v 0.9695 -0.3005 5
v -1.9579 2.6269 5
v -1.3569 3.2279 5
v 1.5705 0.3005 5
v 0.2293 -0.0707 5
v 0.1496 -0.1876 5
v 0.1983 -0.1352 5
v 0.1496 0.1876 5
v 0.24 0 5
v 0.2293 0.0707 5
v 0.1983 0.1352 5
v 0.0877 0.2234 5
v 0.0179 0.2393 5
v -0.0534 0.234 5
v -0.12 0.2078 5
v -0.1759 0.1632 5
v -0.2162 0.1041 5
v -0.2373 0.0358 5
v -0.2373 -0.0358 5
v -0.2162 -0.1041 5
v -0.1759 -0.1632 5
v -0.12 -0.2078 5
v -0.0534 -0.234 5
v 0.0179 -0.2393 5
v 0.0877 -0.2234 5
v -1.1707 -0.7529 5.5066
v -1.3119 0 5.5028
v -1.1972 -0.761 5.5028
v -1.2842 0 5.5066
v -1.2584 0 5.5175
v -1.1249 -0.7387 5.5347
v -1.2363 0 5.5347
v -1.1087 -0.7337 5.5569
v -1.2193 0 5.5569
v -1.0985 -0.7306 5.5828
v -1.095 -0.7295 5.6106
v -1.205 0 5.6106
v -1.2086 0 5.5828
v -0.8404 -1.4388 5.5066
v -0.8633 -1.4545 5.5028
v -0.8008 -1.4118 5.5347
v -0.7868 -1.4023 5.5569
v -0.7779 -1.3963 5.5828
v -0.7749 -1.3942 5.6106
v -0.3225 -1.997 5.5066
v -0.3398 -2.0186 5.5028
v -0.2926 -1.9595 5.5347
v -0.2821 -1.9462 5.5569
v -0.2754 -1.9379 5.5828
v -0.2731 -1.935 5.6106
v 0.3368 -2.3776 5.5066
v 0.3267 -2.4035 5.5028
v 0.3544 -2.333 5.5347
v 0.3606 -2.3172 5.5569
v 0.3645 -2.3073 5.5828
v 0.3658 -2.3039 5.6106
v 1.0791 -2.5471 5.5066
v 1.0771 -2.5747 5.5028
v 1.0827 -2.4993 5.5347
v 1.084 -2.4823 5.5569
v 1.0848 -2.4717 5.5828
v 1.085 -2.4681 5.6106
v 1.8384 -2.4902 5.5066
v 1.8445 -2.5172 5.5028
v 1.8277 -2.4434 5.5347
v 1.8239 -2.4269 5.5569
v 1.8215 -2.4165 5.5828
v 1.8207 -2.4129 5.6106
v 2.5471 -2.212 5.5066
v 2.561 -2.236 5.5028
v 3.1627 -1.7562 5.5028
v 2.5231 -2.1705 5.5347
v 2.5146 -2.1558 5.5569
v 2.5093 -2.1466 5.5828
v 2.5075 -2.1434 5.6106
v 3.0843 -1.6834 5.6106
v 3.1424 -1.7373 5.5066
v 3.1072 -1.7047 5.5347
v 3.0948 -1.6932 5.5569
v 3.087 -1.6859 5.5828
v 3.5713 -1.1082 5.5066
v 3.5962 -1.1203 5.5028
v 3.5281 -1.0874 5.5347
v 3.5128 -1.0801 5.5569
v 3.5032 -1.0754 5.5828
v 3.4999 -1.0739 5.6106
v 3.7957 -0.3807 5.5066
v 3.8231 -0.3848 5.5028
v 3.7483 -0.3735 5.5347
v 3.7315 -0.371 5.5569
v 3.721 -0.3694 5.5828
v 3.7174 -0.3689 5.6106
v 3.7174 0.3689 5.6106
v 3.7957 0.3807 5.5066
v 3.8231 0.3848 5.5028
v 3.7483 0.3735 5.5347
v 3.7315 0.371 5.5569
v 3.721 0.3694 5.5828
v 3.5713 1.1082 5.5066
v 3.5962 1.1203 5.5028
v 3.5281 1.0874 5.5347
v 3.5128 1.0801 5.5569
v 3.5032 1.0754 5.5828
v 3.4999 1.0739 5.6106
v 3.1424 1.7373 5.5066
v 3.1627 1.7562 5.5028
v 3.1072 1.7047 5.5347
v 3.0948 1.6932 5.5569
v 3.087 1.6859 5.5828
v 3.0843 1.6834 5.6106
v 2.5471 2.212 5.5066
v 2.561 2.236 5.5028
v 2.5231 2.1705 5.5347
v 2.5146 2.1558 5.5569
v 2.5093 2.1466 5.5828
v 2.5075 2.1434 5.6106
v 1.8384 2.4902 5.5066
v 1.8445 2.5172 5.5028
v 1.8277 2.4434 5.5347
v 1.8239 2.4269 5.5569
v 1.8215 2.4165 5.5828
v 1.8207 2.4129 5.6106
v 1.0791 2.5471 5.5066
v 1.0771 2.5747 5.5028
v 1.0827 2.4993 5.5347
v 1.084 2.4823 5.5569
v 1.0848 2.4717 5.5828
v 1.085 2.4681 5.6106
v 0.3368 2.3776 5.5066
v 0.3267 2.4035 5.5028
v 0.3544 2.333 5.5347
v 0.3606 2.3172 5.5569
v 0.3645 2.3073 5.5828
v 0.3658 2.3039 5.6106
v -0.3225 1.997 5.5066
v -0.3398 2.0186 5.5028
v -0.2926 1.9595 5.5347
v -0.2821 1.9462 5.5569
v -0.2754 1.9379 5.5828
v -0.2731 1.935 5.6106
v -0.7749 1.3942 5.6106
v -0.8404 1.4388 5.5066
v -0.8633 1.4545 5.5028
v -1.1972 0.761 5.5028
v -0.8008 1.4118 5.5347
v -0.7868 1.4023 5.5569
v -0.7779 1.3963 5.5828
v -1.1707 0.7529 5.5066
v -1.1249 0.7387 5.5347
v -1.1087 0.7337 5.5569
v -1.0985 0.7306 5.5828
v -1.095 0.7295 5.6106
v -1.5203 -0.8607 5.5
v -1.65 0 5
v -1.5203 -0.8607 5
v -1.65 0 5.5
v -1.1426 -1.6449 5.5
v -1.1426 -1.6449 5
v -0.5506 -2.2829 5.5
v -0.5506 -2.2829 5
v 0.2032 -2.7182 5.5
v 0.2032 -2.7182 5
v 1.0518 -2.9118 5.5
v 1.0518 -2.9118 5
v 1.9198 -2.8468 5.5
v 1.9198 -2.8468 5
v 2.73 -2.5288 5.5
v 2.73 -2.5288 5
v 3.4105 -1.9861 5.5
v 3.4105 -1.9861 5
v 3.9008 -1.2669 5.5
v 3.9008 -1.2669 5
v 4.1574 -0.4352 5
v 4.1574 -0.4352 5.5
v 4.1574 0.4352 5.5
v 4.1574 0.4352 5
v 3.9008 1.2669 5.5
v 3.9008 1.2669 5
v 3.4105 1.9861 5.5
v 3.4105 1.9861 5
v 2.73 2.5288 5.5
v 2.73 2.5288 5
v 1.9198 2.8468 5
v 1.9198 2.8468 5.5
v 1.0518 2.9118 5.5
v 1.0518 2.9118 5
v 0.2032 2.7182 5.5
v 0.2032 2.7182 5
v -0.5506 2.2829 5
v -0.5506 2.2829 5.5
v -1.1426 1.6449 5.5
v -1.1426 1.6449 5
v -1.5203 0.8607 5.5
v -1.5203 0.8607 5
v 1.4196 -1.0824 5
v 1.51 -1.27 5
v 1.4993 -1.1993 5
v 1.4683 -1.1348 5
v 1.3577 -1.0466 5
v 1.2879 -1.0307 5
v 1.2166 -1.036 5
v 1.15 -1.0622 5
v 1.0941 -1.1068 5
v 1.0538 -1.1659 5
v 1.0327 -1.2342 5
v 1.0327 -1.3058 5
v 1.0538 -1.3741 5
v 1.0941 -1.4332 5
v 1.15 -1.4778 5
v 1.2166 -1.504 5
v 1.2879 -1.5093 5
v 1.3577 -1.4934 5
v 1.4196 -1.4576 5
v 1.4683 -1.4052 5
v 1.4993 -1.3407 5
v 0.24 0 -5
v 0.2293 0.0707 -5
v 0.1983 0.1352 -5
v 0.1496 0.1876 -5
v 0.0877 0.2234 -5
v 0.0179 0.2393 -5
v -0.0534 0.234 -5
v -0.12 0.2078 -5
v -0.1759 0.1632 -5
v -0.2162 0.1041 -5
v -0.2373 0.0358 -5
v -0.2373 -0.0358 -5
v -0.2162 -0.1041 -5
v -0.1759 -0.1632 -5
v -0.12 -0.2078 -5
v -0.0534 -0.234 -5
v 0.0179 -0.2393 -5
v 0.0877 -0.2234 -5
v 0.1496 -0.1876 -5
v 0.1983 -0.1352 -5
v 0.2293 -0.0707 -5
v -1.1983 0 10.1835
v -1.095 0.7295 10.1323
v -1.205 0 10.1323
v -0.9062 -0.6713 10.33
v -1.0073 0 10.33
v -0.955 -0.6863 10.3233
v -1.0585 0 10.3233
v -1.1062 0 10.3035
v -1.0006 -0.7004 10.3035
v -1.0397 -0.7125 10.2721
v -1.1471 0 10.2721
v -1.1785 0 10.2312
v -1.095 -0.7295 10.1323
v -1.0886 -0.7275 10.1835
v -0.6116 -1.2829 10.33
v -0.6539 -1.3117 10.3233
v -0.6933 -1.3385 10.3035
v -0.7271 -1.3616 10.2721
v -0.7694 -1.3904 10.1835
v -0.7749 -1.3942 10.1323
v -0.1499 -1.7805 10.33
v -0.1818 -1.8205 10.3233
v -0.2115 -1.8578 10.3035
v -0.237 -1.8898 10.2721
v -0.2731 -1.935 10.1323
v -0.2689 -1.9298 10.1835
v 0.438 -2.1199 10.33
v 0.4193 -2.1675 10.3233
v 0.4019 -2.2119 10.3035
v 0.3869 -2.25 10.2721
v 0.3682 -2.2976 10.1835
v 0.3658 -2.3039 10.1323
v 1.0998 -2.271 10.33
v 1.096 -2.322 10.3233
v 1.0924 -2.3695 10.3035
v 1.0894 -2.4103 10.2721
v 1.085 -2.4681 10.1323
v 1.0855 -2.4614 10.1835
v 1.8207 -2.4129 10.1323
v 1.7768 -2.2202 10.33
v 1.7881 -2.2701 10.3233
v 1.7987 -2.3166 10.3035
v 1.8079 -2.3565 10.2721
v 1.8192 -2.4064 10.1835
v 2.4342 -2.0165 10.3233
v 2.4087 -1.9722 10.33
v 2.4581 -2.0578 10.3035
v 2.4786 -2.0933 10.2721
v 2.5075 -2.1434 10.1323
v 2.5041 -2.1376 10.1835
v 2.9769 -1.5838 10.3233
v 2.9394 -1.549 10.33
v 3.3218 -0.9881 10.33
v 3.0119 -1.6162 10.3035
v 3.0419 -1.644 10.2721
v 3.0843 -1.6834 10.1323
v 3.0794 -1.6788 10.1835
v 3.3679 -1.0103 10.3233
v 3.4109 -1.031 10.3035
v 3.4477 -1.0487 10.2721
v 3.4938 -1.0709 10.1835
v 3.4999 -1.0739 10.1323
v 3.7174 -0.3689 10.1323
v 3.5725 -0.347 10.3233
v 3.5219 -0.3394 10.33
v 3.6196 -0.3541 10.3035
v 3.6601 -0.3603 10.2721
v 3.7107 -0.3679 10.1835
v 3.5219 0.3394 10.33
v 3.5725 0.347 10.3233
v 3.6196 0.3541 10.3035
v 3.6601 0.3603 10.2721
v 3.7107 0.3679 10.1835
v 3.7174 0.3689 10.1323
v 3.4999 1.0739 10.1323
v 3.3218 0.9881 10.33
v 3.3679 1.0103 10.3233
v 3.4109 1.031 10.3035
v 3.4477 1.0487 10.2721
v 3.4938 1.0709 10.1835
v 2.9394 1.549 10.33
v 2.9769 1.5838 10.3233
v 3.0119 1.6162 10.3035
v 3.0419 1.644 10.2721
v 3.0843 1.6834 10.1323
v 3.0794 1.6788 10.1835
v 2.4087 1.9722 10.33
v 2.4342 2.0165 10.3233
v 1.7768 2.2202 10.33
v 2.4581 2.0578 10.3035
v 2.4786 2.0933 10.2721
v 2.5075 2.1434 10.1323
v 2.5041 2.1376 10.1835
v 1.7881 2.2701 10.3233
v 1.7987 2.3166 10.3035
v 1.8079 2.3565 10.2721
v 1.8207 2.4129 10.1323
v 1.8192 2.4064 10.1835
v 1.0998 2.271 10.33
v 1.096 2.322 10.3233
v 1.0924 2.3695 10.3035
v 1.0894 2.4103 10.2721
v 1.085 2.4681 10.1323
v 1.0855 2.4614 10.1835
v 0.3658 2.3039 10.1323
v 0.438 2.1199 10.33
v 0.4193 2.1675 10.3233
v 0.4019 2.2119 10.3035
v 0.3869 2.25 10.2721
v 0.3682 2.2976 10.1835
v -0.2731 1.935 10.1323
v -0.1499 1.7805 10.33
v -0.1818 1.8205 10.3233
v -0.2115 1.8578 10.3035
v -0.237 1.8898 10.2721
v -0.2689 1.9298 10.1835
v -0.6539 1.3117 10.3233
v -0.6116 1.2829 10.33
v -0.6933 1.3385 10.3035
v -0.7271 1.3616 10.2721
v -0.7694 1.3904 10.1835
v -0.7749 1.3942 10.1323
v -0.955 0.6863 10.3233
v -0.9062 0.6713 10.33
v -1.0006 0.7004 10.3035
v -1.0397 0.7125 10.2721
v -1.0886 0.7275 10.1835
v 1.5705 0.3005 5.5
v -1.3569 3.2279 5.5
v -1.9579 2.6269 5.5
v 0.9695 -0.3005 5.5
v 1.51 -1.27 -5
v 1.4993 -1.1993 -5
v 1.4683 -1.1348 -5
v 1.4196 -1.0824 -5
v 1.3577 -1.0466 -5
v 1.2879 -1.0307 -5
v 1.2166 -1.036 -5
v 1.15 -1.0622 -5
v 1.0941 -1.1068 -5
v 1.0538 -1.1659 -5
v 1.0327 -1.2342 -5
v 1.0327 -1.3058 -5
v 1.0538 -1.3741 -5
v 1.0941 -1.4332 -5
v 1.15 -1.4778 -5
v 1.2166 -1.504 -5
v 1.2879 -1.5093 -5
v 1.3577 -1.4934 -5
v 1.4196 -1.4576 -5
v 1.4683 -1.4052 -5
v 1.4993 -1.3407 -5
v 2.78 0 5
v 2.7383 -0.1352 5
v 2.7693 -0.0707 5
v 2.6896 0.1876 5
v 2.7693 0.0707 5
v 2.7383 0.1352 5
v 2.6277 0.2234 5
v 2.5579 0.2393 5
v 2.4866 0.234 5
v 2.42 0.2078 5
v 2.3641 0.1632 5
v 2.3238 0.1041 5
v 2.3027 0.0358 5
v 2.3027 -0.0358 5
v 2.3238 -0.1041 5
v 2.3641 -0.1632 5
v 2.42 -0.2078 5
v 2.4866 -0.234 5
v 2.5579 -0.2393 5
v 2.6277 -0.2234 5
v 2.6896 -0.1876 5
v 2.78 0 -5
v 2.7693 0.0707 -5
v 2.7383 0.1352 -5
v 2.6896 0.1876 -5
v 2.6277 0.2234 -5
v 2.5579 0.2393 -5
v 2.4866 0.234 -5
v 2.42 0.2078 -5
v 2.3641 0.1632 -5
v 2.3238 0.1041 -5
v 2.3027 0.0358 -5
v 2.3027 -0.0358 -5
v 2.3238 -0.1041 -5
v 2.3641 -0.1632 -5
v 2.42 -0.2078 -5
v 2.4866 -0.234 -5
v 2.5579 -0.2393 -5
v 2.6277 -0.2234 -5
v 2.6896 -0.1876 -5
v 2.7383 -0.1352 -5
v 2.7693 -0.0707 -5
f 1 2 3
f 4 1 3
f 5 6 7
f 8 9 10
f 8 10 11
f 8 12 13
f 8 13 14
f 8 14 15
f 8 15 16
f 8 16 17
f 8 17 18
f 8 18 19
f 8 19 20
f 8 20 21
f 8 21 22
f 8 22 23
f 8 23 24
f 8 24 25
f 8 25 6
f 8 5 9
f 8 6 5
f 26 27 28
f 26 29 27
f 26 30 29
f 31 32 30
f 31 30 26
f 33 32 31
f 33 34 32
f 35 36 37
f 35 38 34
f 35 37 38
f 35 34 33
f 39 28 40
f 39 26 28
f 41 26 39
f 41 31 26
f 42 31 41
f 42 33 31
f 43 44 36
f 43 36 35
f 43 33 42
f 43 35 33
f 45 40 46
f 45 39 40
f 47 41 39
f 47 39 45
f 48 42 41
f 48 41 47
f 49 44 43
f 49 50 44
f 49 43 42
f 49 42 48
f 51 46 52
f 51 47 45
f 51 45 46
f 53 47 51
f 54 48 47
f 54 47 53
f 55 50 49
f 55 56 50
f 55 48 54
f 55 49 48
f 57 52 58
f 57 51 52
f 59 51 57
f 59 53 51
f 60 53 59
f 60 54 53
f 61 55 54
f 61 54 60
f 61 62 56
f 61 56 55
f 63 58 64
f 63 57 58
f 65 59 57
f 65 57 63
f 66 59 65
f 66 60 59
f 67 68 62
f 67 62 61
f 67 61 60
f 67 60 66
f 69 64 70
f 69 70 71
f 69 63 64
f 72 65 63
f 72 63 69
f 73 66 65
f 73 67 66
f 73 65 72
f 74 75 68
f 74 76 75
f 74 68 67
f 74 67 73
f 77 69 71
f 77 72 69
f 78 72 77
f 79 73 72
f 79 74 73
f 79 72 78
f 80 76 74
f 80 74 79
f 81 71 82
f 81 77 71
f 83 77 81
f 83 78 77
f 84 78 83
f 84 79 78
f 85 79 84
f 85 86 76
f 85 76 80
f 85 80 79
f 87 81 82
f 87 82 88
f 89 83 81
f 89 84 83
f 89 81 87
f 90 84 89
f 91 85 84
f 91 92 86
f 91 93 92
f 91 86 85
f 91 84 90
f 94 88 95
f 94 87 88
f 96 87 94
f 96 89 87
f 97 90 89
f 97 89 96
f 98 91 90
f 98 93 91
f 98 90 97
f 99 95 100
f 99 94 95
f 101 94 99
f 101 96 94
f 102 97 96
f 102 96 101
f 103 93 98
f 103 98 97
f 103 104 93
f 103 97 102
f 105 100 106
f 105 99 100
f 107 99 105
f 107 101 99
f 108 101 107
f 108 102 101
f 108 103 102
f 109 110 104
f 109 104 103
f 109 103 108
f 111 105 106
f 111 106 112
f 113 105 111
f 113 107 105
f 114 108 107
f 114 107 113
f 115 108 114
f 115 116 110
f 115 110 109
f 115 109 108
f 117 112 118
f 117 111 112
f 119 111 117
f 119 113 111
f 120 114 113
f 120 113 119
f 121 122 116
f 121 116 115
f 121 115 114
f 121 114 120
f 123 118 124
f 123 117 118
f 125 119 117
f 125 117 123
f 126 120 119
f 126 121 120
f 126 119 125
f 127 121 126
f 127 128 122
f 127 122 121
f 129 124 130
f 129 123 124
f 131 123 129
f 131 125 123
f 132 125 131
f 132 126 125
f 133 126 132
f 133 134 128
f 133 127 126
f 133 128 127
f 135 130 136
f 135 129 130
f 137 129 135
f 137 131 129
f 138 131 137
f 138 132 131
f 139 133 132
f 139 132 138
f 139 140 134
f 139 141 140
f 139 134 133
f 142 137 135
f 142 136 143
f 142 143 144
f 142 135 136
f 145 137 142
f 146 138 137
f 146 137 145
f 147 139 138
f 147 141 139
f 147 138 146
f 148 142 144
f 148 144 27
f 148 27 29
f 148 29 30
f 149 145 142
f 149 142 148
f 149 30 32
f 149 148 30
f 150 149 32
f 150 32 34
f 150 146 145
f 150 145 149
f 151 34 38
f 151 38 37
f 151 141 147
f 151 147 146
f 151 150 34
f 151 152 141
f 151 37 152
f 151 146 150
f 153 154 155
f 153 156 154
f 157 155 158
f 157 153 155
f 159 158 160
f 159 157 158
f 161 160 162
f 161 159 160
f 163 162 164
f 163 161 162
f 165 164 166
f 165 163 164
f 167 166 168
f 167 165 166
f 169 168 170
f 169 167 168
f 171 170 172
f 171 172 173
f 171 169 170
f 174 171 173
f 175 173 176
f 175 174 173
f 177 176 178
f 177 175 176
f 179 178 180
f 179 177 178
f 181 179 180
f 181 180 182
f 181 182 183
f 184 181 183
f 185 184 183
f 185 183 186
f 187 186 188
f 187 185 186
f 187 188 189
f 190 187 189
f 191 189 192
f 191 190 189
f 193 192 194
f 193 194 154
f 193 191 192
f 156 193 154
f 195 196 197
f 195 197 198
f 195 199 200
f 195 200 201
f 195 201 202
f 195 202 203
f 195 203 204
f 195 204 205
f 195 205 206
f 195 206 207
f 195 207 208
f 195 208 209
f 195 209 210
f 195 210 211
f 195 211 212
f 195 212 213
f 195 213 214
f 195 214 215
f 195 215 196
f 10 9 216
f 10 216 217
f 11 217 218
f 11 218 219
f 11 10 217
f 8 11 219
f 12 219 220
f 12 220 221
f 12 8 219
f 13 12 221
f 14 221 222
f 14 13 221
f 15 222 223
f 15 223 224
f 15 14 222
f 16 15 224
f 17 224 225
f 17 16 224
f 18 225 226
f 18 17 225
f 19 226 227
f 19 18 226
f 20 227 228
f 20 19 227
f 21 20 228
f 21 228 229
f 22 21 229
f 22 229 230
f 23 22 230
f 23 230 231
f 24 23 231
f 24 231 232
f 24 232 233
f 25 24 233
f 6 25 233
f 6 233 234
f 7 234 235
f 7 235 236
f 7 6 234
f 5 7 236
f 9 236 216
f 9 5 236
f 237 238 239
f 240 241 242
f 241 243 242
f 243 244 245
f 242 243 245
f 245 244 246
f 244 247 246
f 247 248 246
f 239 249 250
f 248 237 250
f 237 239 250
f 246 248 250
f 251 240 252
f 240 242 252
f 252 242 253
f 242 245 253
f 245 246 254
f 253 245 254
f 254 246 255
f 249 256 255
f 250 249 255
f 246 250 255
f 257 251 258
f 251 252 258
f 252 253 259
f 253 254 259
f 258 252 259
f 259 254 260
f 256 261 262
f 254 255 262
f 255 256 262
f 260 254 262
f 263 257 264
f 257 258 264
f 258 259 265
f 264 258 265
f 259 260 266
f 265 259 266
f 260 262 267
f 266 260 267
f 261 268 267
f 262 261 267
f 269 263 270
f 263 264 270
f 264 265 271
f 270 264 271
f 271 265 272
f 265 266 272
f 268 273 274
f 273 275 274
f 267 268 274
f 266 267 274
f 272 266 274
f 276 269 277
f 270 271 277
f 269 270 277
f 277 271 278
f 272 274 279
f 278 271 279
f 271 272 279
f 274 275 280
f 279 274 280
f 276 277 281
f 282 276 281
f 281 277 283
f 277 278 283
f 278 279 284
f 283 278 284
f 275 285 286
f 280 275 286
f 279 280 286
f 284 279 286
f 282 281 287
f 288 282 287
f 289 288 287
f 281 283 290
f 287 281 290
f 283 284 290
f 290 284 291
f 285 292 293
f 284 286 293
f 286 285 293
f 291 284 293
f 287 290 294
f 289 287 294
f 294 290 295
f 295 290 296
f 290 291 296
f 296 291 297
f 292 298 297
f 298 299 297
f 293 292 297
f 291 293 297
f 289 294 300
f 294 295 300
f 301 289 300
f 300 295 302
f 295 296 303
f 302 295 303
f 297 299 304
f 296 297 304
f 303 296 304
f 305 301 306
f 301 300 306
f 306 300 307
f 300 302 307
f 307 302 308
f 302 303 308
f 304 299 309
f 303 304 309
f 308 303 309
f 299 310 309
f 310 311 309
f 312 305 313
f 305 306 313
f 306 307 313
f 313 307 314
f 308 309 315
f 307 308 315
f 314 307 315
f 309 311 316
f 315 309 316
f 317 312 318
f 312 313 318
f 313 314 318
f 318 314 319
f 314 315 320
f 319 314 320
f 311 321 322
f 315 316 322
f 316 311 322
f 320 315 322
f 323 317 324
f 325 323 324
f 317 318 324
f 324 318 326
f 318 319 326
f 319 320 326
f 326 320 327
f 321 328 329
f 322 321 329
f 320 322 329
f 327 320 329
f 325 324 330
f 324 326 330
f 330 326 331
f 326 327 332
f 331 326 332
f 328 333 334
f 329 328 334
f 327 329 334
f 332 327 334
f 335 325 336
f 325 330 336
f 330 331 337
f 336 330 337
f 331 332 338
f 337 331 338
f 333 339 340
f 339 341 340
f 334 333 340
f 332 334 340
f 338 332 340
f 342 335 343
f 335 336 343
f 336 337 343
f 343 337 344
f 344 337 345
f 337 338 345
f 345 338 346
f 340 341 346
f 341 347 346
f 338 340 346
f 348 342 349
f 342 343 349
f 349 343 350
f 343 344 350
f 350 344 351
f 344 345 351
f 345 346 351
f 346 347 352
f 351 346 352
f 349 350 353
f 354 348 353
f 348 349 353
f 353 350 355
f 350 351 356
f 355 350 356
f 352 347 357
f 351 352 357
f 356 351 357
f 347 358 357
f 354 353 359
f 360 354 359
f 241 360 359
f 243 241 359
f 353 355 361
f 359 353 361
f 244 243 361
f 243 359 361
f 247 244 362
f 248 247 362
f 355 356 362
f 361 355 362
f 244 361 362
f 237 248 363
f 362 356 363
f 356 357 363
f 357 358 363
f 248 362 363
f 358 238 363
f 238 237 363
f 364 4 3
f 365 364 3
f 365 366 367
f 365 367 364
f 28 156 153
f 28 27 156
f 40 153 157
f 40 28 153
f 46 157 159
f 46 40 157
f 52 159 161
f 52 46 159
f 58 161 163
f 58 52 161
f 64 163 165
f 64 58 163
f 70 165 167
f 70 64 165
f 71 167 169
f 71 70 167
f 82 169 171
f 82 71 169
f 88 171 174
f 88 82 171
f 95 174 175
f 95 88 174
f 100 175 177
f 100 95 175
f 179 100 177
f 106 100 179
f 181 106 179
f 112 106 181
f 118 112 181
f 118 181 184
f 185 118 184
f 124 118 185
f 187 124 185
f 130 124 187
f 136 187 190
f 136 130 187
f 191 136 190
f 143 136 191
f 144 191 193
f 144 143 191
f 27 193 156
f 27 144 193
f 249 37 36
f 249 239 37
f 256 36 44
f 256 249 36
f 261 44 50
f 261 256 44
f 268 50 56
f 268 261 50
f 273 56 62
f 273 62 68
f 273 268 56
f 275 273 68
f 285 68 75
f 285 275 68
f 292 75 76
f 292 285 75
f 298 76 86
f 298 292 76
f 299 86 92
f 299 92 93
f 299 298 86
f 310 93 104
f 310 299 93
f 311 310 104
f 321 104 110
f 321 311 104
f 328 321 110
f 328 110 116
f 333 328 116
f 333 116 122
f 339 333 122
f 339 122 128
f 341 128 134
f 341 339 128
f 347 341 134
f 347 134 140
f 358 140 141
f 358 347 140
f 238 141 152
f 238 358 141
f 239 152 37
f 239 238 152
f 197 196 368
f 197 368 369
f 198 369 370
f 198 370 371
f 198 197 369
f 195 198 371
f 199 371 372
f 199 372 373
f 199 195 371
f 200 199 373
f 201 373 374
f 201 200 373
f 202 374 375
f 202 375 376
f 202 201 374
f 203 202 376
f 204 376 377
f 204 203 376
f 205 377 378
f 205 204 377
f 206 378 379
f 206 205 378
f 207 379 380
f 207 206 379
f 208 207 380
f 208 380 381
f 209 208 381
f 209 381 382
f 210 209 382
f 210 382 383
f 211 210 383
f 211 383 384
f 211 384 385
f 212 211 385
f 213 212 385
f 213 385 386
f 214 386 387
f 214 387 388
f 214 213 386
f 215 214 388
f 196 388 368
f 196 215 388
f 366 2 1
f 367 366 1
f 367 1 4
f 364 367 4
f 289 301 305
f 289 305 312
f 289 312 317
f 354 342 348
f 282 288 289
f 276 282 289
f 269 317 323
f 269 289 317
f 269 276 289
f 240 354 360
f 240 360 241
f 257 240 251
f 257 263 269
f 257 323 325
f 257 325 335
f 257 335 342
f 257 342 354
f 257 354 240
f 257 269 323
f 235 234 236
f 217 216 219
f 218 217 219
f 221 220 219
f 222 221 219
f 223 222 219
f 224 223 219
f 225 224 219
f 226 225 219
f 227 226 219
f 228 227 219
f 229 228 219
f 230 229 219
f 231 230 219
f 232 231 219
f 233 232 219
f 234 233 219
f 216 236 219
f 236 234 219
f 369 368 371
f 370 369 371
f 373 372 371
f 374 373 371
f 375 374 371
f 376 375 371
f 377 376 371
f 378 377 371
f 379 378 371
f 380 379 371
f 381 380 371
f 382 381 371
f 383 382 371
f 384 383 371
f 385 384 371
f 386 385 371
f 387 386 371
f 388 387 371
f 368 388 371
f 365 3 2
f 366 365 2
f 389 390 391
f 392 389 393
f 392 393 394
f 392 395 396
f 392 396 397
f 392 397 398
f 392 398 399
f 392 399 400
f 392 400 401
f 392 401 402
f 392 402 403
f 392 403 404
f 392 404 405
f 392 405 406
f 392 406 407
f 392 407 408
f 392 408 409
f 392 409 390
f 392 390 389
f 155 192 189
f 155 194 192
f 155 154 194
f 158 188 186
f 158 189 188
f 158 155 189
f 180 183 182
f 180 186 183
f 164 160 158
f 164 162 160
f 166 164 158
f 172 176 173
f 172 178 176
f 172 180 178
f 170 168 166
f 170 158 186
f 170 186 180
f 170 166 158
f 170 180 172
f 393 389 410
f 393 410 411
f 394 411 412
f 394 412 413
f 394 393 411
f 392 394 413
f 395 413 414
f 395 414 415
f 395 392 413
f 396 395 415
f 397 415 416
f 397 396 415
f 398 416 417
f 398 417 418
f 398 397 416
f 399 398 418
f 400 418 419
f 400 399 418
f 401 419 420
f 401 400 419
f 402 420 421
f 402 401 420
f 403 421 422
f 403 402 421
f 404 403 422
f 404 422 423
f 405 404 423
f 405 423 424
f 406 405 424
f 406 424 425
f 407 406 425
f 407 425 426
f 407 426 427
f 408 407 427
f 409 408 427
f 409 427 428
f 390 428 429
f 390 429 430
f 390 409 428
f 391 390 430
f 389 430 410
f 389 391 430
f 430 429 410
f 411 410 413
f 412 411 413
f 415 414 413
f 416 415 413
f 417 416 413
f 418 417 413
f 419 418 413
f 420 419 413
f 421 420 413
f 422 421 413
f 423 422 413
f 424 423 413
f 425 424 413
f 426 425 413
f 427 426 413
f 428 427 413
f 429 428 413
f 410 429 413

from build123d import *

# Parameters (mm, degrees)
SKETCH_R     = 0.24
PAD_DEPTH    = 10
SKETCH001_R  = 0.24
PAD002_DEPTH = 10
PAD003_DEPTH = 0.5
SKETCH005_R  = 0.24
PAD004_DEPTH = 10


with BuildPart() as pad:
    # Sketch → Pad (new body)
    with BuildSketch(Plane.XY.offset(5)):
        Circle(SKETCH_R)
    extrude(amount=-PAD_DEPTH)


with BuildPart() as pad002:
    # Sketch001 → Pad002 (new body)
    with BuildSketch(Plane.XY.offset(5)):
        with Locations((2.54, 0)):
            Circle(SKETCH001_R)
    extrude(amount=-PAD002_DEPTH)


with BuildPart() as revolution:
    # Sketch003 → Revolution (revolve)
    with BuildSketch(Plane.XZ):
        with BuildLine():
            Line((1.27, 5), (-1.65, 5))
            Line((-1.65, 5), (-1.65, 5.5))
            Line((-1.65, 5.5), (-1.311932, 5.502782))
            ThreePointArc((-1.311932, 5.502782), (-1.236267, 5.534672), (-1.205, 5.610597))
            Line((-1.205, 5.610597), (-1.205, 10.132333))
            ThreePointArc((-1.007333, 10.33), (-1.147105, 10.272105), (-1.205, 10.132333))
            Line((-1.007333, 10.33), (1.27, 10.33))
            Line((1.27, 10.33), (1.27, 5))
        make_face()
    revolve(axis=Axis((1.27, 0, 2.550668), (0, 0, 1)))


with BuildPart() as pad003:
    # Sketch004 → Pad003 (new body)
    with BuildSketch(Plane.XY.offset(5)):
        Polygon((1.57052, 0.30052), (-1.356902, 3.227942), (-1.957942, 2.626902), (0.96948, -0.30052), align=None)
    extrude(amount=PAD003_DEPTH)


with BuildPart() as pad004:
    # Sketch005 → Pad004 (new body)
    with BuildSketch(Plane.XY.offset(5)):
        with Locations((1.27, -1.27)):
            Circle(SKETCH005_R)
    extrude(amount=-PAD004_DEPTH)


solid = Compound([pad.part, pad002.part, revolution.part, pad003.part, pad004.part])
